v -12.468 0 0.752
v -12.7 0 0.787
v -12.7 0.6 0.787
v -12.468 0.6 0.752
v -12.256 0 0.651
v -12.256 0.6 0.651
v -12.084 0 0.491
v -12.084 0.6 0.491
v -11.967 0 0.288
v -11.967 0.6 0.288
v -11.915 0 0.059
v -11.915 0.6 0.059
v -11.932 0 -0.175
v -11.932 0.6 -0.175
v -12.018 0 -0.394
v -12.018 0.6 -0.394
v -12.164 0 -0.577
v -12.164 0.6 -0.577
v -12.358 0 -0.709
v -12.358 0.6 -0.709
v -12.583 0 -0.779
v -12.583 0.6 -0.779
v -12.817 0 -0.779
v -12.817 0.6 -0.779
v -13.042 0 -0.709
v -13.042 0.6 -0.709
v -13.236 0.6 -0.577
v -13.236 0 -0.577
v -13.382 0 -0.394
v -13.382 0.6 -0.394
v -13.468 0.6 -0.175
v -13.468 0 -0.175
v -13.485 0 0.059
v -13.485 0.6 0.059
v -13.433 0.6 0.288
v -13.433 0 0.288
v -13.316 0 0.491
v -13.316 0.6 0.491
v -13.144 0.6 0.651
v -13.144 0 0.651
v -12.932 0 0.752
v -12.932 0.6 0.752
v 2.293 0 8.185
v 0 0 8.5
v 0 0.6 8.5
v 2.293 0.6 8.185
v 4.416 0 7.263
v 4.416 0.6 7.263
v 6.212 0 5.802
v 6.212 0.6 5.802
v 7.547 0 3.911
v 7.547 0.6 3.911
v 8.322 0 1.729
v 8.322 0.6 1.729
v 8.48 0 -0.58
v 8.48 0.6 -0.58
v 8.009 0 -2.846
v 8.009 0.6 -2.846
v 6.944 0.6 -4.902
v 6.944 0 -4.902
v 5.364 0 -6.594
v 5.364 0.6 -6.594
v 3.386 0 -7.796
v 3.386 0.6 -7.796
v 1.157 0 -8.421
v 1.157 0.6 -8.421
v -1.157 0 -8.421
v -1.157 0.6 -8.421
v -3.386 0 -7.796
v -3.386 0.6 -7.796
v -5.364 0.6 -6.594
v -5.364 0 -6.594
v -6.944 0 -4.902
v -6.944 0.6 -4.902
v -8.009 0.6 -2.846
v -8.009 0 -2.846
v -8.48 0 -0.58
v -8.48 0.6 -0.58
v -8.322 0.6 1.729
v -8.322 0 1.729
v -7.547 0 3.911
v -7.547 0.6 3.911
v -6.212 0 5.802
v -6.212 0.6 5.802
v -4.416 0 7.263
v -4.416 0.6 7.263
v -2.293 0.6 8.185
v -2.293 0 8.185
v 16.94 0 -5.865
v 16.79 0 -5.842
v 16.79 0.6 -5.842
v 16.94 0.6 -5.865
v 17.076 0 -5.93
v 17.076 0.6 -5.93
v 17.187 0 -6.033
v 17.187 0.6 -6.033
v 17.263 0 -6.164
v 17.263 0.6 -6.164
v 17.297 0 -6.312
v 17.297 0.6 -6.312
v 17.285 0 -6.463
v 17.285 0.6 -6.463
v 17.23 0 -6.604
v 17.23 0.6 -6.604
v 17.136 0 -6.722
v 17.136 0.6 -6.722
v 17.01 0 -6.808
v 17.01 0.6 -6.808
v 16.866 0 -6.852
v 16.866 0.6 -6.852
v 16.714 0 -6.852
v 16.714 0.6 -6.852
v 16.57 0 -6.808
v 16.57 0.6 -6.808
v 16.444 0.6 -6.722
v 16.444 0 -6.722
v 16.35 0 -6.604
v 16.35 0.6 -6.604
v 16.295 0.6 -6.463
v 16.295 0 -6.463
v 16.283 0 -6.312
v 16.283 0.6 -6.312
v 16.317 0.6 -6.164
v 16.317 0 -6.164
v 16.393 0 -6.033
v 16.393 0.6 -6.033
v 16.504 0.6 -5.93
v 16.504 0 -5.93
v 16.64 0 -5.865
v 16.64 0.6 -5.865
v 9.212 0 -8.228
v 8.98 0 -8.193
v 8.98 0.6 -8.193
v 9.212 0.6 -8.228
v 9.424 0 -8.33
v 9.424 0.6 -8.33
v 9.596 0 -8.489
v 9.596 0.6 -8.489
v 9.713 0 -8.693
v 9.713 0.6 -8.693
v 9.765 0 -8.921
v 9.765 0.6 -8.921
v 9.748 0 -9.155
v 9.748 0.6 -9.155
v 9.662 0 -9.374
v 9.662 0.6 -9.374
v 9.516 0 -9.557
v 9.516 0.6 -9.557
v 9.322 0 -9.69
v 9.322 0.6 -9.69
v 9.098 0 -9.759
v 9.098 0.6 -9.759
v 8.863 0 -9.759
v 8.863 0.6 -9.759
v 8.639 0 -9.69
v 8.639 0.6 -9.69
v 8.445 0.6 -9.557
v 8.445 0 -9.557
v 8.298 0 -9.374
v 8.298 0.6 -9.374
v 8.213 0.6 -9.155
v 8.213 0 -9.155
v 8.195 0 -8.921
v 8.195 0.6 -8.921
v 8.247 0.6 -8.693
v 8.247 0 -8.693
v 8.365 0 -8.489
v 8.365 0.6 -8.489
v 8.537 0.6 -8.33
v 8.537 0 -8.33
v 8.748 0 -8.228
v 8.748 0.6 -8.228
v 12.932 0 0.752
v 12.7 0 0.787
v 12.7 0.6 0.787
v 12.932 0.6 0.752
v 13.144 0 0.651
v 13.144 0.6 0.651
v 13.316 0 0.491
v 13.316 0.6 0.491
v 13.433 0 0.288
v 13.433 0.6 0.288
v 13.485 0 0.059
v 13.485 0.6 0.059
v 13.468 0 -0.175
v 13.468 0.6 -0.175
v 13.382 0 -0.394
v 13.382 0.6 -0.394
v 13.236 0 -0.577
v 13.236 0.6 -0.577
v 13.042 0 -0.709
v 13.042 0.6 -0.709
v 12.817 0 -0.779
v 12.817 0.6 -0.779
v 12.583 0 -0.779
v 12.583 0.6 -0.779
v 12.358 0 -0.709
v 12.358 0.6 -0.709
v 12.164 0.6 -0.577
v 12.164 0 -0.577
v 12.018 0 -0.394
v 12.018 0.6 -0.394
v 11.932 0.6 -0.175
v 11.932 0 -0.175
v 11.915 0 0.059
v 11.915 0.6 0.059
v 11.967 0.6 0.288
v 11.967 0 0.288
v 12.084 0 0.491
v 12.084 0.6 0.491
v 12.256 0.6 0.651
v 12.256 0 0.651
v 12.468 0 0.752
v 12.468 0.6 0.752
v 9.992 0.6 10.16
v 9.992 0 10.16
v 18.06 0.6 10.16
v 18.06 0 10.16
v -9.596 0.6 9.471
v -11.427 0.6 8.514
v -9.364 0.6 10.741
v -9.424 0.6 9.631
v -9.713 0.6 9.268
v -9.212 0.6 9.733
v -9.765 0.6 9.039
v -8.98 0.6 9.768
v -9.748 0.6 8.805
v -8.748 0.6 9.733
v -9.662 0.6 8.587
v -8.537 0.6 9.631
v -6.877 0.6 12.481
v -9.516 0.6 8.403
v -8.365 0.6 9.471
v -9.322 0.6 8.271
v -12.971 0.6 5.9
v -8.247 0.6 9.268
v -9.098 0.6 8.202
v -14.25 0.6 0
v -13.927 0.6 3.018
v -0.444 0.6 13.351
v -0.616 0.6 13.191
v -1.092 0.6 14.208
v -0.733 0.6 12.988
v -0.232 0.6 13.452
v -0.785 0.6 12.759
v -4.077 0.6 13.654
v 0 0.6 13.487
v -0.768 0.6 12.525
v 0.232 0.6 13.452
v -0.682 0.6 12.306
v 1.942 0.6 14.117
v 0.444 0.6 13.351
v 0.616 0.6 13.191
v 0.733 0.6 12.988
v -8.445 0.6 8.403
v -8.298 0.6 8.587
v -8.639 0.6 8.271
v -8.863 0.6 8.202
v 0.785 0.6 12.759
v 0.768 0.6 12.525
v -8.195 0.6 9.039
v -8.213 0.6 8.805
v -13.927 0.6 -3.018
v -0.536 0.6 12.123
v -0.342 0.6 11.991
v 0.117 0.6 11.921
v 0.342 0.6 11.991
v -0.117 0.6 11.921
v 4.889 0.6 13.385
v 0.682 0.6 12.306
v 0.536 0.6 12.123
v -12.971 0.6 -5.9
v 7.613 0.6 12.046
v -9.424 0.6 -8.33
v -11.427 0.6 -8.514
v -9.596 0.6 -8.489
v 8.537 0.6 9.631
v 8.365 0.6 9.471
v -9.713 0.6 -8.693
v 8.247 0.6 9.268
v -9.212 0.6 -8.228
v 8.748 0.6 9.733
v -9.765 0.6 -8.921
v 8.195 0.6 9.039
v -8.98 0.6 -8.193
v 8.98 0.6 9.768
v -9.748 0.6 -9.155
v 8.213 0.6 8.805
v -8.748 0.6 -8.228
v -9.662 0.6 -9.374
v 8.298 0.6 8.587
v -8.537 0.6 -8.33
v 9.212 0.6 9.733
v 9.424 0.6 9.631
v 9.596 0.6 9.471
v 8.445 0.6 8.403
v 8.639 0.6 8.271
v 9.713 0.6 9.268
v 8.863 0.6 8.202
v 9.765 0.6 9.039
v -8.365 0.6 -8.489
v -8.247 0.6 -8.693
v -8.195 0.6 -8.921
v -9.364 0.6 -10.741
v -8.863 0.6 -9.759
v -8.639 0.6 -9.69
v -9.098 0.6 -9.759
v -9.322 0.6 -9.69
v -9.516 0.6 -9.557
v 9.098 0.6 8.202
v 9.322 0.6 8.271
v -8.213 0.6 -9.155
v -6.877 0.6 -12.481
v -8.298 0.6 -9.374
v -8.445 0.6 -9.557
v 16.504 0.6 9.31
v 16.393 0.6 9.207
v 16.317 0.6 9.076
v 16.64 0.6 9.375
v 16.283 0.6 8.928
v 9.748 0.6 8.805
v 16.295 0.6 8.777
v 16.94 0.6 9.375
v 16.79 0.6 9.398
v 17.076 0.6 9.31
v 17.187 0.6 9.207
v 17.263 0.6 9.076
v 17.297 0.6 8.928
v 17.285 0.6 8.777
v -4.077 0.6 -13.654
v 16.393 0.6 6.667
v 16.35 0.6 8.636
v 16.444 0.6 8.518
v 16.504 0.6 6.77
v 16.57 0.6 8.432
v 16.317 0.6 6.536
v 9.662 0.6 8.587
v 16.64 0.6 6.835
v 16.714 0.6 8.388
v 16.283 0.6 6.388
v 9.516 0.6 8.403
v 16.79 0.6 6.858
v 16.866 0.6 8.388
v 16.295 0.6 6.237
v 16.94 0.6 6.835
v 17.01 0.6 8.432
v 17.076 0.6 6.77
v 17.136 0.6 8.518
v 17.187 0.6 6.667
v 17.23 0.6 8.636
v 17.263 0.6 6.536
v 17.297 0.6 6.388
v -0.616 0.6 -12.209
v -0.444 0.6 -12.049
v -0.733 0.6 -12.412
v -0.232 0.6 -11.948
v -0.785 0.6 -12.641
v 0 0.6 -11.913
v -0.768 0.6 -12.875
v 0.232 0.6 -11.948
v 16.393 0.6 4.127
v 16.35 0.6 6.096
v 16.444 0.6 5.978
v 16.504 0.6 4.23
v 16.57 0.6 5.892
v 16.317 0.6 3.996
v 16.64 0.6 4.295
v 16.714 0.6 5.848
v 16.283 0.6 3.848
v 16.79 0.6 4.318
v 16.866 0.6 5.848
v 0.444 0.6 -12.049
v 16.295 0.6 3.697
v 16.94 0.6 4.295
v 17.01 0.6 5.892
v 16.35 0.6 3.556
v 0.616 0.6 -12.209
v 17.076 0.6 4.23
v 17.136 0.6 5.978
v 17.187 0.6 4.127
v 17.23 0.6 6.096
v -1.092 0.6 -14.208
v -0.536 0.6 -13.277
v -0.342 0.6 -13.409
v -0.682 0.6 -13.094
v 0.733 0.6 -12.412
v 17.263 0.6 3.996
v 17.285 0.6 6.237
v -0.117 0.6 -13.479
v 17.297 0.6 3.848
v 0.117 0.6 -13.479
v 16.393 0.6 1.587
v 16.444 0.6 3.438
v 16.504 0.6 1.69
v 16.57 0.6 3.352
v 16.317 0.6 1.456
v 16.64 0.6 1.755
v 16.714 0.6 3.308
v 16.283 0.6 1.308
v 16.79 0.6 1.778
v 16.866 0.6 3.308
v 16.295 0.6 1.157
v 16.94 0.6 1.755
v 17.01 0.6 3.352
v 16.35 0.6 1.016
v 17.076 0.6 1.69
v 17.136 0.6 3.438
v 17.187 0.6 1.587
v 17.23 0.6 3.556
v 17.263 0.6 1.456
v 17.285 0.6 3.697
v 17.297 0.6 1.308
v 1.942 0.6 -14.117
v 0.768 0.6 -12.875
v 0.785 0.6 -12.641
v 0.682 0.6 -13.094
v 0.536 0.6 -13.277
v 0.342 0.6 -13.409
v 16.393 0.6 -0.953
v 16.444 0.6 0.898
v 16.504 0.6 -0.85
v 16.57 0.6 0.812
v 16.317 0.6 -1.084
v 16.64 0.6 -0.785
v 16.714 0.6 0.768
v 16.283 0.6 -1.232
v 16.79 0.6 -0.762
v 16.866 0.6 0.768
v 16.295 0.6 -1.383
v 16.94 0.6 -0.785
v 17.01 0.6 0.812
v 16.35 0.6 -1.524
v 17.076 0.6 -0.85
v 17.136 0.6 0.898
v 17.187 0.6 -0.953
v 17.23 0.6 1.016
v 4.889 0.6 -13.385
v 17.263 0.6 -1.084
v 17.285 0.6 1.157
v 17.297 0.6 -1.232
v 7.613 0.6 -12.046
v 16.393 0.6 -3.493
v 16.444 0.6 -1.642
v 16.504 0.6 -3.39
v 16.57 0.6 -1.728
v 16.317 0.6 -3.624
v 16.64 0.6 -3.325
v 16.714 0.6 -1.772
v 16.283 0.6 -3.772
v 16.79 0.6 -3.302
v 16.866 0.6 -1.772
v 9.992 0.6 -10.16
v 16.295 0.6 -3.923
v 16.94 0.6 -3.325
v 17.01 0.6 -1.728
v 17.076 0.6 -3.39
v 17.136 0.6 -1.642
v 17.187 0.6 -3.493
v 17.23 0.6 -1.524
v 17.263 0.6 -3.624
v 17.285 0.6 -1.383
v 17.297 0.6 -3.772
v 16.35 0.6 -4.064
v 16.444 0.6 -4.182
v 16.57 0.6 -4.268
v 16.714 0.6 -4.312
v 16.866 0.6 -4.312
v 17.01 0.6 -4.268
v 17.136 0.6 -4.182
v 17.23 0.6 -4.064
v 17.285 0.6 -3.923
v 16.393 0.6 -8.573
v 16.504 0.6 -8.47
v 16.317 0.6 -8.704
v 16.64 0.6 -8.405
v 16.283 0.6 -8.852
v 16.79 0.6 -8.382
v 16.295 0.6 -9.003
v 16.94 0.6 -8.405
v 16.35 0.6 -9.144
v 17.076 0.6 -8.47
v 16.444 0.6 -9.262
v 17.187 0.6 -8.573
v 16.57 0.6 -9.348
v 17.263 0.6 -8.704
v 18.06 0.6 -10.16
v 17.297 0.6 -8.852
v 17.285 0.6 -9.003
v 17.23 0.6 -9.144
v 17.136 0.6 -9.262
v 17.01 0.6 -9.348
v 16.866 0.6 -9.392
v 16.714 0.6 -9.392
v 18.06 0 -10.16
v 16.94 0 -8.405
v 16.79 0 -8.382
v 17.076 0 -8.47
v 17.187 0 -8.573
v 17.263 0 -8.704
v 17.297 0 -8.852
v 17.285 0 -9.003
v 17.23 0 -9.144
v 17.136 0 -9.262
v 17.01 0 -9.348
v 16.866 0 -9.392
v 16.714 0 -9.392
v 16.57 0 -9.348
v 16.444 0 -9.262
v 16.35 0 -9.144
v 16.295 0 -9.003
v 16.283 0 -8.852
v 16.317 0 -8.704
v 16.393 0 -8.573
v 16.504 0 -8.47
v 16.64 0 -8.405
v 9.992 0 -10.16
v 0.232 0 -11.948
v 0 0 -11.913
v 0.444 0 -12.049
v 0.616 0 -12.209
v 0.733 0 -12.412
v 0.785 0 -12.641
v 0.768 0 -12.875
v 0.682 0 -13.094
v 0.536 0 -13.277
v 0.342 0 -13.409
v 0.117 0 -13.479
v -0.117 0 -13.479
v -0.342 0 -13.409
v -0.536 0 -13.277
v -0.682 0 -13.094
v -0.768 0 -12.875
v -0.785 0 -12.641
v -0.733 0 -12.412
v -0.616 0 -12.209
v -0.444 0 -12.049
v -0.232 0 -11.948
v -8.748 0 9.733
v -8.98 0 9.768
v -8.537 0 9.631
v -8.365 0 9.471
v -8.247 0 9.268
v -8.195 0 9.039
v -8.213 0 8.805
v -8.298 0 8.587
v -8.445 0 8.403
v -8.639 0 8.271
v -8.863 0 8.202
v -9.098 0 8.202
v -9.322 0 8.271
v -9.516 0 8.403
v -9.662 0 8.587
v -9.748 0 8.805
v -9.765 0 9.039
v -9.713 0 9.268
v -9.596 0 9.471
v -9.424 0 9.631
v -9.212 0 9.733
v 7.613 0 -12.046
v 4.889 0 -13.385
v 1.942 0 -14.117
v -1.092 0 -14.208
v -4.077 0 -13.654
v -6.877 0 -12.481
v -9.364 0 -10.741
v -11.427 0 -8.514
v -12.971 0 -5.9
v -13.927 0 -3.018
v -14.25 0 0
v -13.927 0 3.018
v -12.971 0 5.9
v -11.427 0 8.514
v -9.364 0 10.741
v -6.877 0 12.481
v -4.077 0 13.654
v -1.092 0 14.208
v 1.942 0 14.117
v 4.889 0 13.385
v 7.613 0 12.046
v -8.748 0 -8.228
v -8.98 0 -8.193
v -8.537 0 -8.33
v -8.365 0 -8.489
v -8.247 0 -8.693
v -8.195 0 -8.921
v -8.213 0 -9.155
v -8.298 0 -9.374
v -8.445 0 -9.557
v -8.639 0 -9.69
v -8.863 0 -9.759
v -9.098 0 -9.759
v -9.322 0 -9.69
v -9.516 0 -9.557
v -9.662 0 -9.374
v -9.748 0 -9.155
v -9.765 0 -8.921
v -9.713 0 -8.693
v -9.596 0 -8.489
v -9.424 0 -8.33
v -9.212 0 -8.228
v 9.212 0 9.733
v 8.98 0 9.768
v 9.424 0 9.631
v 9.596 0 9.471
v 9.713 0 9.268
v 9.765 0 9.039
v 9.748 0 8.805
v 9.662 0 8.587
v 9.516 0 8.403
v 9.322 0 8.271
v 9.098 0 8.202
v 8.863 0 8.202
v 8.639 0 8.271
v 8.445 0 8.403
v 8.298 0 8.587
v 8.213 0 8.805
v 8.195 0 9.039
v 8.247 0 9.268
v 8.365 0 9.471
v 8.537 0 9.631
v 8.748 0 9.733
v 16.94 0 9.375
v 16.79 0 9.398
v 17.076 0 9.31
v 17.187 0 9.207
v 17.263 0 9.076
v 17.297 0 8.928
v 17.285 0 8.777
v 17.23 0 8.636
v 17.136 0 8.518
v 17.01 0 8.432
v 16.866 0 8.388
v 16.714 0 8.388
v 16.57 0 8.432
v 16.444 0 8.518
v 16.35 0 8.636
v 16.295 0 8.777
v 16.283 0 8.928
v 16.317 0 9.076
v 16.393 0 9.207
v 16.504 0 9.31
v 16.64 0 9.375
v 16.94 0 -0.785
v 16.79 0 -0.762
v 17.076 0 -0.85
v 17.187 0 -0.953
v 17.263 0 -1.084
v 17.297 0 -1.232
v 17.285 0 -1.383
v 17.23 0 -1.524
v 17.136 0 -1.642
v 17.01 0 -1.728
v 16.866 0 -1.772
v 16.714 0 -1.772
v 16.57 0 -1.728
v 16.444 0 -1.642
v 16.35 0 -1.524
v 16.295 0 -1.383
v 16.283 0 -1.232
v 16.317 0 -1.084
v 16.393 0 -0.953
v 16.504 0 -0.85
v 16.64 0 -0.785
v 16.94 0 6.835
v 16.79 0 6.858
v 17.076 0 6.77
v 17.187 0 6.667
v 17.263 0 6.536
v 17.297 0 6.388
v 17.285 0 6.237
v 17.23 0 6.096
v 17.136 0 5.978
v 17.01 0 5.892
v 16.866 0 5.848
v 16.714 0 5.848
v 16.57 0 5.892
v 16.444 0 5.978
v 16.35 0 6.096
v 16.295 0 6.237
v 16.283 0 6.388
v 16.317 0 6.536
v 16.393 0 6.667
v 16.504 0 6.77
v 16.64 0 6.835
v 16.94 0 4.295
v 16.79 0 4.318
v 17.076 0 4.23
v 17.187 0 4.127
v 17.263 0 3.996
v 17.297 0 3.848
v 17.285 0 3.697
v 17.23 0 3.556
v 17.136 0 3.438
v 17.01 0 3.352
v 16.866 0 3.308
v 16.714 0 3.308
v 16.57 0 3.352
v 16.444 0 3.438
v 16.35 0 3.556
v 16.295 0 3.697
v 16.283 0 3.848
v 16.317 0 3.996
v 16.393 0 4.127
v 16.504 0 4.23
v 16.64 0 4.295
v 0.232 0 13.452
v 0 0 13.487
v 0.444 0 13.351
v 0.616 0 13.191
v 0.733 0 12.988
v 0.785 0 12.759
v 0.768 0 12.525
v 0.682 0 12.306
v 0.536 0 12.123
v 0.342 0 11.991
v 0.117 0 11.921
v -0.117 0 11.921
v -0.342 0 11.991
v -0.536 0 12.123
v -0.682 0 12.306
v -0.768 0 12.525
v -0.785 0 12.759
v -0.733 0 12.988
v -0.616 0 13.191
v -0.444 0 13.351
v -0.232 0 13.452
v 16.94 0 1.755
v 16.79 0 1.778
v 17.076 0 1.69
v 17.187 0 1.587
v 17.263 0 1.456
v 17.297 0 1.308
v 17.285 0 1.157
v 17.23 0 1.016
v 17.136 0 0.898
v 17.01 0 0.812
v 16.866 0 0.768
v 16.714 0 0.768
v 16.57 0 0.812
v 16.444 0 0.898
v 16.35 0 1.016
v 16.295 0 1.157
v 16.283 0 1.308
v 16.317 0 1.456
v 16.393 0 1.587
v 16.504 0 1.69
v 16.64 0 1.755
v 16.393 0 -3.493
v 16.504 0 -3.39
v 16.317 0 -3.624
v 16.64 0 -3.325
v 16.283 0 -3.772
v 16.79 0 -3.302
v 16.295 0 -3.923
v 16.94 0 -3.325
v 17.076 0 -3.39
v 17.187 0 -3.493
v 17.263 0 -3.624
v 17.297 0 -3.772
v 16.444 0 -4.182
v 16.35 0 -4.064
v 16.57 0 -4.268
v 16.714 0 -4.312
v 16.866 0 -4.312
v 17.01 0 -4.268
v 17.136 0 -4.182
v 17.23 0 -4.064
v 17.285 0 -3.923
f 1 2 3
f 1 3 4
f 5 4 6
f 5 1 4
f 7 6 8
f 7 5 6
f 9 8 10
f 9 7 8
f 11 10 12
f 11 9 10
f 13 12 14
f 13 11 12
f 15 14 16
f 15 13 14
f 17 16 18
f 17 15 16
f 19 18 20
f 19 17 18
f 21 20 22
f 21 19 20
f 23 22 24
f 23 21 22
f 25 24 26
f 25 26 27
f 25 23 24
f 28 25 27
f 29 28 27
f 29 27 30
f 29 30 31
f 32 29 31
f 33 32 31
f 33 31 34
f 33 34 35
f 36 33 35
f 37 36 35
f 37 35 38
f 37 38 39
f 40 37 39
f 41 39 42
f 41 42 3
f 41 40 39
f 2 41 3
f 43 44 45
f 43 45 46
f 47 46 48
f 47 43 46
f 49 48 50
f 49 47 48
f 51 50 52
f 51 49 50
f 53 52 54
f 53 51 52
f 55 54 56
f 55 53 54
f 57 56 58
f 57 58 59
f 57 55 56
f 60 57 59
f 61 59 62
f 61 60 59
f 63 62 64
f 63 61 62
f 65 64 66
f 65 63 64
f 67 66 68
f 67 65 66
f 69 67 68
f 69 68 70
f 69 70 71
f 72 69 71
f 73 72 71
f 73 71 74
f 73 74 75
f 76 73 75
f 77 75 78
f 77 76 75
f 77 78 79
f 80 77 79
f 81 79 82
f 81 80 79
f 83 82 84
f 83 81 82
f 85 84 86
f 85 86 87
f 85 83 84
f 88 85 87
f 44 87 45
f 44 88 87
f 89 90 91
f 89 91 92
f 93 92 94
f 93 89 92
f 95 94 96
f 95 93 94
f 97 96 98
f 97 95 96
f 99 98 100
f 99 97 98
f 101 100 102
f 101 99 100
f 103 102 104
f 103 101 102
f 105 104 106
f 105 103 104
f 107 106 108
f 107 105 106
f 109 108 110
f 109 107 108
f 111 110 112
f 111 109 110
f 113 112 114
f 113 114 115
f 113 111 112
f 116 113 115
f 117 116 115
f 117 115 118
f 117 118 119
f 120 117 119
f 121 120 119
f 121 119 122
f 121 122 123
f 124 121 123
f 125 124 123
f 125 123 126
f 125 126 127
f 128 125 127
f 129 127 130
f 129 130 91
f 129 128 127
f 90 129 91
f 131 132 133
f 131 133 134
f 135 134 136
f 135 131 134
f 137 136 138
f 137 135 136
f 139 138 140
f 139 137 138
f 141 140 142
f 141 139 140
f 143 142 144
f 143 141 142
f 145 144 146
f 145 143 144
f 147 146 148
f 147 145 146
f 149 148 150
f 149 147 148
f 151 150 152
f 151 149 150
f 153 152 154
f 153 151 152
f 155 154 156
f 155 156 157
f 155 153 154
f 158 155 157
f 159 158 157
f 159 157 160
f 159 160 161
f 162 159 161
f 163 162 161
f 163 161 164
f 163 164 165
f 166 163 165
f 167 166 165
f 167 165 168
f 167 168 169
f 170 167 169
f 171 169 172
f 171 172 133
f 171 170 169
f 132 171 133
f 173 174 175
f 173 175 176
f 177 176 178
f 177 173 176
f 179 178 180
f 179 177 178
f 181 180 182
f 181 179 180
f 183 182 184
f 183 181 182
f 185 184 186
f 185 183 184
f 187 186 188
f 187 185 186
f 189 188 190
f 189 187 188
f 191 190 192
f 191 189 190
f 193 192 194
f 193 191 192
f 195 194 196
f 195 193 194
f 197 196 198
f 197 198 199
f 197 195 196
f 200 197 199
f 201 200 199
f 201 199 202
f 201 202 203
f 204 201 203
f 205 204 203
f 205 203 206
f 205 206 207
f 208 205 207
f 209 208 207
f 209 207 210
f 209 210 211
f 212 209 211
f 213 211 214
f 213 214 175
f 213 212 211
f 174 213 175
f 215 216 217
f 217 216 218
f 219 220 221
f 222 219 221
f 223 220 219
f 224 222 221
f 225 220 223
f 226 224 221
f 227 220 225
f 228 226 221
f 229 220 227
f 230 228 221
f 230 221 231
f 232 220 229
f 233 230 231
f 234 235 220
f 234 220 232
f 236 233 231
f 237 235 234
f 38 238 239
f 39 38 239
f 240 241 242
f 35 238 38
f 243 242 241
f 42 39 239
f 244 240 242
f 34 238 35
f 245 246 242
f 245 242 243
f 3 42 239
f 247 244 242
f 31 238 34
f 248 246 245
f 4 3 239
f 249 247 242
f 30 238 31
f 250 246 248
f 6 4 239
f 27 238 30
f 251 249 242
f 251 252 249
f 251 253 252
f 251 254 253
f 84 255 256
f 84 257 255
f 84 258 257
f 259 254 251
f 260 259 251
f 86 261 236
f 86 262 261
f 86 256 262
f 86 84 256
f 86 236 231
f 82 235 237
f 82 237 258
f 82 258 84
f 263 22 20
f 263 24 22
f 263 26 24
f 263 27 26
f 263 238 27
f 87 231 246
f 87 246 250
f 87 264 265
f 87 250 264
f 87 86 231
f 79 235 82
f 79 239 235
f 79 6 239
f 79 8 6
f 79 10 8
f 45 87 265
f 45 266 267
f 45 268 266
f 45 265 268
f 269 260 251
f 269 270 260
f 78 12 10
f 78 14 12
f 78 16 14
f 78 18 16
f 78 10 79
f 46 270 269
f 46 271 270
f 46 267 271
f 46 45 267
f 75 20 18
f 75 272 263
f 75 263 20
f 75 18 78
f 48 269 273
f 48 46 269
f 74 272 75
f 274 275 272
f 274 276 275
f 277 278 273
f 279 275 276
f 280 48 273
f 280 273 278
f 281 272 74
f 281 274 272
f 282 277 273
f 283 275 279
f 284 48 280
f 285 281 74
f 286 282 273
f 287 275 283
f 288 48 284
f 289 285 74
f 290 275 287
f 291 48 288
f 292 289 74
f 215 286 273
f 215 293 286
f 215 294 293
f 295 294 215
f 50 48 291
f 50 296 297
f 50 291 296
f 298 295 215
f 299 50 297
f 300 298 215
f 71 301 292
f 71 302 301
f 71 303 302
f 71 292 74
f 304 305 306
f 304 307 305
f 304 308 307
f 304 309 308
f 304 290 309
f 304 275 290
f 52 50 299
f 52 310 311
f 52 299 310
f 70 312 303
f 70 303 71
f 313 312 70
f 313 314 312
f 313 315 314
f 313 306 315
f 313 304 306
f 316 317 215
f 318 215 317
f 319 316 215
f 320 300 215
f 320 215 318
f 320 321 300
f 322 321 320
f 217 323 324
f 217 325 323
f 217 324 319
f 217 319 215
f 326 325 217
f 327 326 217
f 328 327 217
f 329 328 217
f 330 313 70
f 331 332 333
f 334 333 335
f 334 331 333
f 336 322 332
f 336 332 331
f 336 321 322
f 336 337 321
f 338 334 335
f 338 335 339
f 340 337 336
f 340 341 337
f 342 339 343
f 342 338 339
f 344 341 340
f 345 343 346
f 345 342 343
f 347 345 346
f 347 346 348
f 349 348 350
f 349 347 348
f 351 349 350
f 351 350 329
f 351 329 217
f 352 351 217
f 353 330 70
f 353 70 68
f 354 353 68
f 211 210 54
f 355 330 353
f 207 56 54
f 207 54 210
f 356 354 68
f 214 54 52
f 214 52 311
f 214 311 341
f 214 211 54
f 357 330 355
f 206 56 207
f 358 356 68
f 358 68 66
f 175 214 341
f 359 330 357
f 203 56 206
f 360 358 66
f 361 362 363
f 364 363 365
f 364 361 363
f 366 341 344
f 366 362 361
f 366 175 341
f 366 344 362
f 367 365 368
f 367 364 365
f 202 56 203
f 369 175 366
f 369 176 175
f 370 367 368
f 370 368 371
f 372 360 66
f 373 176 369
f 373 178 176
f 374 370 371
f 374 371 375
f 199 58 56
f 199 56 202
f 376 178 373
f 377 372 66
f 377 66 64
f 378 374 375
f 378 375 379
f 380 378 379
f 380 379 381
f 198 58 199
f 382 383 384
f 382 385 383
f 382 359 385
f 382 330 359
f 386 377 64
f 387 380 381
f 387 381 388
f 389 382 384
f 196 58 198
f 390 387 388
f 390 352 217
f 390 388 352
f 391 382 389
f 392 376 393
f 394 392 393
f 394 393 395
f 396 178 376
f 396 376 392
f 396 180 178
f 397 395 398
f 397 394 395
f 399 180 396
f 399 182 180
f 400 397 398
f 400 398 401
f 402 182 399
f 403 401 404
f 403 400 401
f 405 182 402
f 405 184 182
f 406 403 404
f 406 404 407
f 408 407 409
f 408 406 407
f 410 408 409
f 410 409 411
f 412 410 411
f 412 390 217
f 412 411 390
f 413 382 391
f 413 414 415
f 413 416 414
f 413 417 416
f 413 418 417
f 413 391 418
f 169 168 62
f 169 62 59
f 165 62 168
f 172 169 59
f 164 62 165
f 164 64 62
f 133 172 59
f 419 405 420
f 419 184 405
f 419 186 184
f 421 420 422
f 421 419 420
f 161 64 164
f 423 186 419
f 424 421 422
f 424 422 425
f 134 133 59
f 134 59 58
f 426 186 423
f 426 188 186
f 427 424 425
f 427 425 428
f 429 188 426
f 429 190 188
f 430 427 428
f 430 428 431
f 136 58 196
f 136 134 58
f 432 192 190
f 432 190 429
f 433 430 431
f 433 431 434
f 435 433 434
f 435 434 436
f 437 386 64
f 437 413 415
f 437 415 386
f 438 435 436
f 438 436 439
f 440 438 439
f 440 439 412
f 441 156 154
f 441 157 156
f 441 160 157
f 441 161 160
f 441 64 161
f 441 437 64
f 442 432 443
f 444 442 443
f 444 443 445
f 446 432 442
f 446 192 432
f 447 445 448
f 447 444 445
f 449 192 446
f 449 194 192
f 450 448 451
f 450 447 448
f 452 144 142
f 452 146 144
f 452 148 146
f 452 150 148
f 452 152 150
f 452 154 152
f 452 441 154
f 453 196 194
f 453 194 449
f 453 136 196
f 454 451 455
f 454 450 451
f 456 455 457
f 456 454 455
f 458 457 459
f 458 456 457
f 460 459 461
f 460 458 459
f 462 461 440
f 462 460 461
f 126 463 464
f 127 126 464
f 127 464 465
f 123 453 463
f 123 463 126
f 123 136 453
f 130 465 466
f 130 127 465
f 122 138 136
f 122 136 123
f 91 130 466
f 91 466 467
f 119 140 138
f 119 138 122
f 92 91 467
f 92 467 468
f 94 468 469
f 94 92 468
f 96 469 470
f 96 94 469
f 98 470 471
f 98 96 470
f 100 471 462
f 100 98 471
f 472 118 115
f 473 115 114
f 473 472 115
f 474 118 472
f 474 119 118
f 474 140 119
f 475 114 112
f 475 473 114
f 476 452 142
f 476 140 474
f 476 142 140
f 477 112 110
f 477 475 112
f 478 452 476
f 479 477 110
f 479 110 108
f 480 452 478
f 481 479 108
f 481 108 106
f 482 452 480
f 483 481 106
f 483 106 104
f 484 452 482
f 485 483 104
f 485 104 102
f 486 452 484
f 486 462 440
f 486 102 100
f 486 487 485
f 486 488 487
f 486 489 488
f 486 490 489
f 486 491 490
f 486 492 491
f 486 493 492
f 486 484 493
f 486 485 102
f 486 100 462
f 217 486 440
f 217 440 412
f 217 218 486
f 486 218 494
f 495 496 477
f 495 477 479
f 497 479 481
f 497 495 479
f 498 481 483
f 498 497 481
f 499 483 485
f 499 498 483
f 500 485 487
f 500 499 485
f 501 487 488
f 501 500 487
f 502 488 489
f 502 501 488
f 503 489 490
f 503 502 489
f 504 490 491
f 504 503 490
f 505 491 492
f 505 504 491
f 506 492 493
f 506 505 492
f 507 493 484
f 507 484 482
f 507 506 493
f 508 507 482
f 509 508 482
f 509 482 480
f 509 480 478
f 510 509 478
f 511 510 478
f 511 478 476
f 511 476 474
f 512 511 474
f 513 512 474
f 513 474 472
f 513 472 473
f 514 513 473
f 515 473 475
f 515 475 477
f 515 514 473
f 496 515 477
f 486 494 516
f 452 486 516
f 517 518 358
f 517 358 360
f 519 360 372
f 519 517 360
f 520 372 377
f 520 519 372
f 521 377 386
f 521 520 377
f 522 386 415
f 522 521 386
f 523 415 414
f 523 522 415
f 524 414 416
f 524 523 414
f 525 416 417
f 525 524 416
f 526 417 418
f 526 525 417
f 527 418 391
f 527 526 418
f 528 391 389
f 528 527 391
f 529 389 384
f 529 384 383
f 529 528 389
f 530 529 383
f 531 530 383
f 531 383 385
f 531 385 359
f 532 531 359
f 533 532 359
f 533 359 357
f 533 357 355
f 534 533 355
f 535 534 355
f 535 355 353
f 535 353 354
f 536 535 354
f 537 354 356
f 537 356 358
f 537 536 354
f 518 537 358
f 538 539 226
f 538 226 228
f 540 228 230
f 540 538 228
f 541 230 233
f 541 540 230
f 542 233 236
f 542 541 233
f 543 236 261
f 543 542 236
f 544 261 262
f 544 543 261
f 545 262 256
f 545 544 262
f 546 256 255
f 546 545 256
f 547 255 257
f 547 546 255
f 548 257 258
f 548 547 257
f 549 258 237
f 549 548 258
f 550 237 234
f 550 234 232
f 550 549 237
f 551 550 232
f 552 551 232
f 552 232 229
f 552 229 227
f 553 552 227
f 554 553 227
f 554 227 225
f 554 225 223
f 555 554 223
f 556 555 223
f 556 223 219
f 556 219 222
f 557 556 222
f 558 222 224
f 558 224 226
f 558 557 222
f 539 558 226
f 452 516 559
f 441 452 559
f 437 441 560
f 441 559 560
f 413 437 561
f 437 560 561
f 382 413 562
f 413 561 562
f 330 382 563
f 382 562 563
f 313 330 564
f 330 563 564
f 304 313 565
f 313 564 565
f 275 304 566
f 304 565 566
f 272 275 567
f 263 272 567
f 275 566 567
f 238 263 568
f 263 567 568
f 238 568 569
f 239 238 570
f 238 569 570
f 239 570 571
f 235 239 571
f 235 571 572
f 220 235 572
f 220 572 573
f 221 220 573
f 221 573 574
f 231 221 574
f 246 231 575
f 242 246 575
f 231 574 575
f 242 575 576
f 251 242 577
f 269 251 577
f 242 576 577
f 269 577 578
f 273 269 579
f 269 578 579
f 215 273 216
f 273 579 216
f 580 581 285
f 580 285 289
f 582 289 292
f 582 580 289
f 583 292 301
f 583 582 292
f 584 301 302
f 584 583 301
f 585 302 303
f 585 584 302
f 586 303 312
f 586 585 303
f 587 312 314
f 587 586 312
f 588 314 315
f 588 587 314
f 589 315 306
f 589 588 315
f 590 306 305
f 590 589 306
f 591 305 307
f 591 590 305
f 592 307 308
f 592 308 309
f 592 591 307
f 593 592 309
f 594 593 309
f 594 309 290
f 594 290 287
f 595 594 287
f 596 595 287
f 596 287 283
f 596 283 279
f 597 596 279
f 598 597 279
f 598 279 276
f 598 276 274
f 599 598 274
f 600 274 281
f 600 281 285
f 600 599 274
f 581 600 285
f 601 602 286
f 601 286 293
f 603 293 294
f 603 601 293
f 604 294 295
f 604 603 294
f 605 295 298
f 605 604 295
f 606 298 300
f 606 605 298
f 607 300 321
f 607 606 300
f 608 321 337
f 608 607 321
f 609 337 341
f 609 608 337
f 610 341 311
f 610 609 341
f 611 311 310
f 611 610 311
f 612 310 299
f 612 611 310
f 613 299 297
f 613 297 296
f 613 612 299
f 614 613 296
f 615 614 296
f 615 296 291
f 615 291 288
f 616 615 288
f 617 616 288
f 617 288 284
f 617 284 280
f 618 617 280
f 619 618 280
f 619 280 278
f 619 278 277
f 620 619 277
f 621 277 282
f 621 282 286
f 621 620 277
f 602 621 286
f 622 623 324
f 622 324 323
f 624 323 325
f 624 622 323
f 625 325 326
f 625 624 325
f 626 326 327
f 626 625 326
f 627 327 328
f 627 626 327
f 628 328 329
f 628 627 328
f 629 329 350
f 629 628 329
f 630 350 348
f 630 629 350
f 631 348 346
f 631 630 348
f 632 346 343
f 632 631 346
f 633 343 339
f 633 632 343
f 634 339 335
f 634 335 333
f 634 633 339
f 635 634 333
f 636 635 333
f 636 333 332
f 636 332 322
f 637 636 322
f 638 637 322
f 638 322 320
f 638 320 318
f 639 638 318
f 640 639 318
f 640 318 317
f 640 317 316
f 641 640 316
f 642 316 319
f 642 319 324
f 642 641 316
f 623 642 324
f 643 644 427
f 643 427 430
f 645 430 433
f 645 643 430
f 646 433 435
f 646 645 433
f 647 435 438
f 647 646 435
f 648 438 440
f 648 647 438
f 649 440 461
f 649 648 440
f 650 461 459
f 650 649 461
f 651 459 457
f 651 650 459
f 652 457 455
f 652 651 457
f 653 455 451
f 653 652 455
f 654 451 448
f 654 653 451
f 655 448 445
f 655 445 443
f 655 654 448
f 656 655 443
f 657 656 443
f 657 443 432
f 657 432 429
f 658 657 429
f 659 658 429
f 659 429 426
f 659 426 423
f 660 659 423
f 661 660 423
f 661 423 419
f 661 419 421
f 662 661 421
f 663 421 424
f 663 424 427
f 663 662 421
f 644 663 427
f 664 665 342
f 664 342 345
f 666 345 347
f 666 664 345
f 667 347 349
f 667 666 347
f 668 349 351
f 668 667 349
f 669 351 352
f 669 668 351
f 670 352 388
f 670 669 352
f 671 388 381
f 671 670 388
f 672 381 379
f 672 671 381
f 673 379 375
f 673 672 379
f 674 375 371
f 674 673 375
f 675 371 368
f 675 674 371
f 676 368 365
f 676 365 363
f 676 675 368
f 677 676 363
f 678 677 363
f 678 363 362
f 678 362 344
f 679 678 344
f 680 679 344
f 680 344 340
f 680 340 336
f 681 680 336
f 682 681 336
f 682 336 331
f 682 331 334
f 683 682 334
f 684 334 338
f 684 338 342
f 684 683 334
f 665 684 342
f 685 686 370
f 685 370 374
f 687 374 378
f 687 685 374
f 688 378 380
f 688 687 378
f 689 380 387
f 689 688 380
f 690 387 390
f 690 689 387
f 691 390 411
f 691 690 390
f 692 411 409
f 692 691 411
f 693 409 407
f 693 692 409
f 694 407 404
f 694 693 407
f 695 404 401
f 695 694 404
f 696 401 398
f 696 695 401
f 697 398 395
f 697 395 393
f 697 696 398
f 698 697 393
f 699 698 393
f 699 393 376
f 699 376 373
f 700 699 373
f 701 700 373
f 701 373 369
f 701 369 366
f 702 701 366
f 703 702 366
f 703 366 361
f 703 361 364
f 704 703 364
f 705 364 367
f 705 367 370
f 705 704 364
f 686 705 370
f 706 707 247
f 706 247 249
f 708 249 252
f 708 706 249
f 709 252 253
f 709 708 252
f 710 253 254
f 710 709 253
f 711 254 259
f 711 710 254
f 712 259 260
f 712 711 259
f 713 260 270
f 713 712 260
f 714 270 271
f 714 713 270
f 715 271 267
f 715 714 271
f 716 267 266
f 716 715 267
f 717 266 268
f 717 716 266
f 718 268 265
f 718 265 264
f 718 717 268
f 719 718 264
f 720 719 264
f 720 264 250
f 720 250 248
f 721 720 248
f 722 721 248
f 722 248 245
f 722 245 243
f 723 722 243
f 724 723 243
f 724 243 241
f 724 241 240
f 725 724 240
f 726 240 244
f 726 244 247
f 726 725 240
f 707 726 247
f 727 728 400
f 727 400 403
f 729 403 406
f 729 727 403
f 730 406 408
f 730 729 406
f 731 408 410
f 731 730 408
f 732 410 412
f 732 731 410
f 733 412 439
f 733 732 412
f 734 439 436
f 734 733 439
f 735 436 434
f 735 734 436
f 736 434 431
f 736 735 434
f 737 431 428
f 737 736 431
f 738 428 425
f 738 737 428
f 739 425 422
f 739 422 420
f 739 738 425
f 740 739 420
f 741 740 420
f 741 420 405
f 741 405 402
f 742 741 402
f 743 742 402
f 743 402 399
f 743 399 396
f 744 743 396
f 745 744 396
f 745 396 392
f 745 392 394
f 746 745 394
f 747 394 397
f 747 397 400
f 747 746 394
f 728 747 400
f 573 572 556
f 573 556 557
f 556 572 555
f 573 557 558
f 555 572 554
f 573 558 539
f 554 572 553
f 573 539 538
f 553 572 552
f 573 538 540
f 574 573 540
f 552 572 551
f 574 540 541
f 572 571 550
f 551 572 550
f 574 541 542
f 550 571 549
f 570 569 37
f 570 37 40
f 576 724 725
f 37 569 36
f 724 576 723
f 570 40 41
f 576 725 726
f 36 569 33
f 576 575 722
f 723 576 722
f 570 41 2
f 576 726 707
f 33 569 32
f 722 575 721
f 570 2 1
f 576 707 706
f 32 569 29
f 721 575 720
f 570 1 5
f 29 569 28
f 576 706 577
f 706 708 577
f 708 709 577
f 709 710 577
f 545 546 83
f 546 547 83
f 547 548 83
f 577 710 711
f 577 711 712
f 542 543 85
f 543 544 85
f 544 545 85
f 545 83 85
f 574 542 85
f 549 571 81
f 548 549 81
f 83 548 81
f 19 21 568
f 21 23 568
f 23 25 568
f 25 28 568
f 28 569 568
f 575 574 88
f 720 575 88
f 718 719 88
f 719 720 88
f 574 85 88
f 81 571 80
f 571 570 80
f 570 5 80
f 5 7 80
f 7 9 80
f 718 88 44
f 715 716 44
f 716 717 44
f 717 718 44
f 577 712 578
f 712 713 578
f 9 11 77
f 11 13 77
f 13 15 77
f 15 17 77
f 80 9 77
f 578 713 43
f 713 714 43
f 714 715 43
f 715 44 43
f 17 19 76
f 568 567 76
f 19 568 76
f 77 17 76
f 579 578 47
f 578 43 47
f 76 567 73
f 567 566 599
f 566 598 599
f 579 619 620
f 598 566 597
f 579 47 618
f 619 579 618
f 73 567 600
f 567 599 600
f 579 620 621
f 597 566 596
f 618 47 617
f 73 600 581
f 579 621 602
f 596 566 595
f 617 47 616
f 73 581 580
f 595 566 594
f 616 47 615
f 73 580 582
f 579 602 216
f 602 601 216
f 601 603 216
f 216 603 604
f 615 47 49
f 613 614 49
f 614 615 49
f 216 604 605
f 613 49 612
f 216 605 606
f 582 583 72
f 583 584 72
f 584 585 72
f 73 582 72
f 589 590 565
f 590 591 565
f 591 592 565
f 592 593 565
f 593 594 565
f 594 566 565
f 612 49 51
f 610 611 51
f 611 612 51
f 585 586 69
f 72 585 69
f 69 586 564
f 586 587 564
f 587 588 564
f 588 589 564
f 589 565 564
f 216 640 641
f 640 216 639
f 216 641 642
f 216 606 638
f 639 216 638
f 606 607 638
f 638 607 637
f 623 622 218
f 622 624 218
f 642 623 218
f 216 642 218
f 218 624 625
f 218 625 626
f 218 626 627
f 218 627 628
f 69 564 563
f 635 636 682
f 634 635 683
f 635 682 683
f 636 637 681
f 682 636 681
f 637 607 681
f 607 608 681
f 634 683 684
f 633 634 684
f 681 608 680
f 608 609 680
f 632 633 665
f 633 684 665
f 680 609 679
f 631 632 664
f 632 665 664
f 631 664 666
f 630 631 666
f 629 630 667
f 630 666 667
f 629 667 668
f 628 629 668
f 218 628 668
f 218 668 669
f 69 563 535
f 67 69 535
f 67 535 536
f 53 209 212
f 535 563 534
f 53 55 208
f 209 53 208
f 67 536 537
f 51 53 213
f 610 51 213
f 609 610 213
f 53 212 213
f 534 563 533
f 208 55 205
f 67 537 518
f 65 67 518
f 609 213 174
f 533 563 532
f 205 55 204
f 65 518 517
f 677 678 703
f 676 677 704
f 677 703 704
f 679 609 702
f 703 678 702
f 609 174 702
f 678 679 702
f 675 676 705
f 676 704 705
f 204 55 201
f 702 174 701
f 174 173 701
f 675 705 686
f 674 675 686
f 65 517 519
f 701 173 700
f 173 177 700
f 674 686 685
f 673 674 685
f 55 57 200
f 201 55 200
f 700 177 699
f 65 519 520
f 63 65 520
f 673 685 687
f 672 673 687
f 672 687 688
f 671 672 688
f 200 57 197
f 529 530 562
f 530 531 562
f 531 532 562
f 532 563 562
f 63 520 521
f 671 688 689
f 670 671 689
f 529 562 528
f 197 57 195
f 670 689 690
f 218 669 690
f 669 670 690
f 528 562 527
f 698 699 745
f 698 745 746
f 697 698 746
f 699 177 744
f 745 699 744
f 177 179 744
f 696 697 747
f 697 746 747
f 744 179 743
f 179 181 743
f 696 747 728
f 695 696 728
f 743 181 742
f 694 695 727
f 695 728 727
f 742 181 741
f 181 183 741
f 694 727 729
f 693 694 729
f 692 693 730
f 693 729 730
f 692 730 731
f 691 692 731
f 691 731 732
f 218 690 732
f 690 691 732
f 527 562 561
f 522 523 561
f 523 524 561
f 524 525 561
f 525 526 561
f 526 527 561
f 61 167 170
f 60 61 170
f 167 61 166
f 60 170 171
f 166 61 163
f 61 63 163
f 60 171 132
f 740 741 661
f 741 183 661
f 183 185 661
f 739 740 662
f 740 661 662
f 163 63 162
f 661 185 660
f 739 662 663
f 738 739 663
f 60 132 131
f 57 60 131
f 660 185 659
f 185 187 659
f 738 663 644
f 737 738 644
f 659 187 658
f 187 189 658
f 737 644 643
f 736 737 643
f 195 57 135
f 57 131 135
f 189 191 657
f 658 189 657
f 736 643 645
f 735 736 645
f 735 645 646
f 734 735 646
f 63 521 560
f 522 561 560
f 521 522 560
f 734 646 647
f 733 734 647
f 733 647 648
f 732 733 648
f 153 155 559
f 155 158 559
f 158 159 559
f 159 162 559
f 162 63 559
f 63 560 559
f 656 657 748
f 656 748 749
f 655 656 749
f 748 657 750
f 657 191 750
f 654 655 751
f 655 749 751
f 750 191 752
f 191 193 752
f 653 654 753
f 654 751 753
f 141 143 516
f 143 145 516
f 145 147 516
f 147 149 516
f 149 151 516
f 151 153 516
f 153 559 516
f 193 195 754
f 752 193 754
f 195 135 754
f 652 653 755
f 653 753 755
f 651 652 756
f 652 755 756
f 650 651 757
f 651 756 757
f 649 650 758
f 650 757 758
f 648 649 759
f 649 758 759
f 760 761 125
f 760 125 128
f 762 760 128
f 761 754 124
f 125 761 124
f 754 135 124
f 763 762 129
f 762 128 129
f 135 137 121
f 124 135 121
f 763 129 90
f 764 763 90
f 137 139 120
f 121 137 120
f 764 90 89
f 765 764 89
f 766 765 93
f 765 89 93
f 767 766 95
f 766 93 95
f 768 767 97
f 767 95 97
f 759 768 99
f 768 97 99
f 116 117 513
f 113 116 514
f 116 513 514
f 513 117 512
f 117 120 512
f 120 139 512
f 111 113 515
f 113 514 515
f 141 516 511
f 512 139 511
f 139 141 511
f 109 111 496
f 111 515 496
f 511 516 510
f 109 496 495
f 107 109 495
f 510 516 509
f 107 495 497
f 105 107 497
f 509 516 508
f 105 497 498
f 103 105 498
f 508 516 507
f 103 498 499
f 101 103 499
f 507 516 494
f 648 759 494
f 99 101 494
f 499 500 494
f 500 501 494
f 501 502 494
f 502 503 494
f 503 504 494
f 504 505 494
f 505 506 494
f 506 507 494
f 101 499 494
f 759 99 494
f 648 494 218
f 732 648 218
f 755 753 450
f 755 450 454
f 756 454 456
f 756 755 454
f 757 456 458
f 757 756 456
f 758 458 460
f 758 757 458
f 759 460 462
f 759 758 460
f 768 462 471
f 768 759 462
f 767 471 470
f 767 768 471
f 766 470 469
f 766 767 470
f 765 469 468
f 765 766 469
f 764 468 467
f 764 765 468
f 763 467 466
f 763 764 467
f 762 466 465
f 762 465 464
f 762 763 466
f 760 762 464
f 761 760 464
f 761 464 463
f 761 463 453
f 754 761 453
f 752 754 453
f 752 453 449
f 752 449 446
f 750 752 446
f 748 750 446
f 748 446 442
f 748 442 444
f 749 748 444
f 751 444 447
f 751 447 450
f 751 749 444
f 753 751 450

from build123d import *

# Parameters (mm, degrees)
SKETCH1_R           = 0.7874
SKETCH1_R_2         = 8.5
SKETCH1_R_3         = 0.508
BOSS_EXTRUDE1_DEPTH = 0.6


with BuildPart() as part:
    # Sketch1 → Boss-Extrude1 (new body)
    # profile 1 of 3: a face of its own
    with BuildSketch(Plane(origin=(0, 0, 0), x_dir=(1, 0, 0), z_dir=(0, 1, 0))):
        with BuildLine():
            Line((9.991841672, -10.16), (9.991841672, 10.16))
            ThreePointArc((9.991841672, 10.16), (-14.25, 0), (9.991841672, -10.16))
        make_face()
        with Locations(Location((-8.980256121, -8.980256121, 0), (0, 0, 270))):
            Circle(SKETCH1_R, mode=Mode.SUBTRACT)
        with Locations(Location((0, -12.7, 0), (0, 0, 270))):
            Circle(SKETCH1_R, mode=Mode.SUBTRACT)
        with Locations(Location((8.980256121, -8.980256121, 0), (0, 0, 270))):
            Circle(SKETCH1_R, mode=Mode.SUBTRACT)
        with Locations(Location((-12.7, 0, 0), (0, 0, 270))):
            Circle(SKETCH1_R, mode=Mode.SUBTRACT)
        with Locations(Location((0, 0, 0), (0, 0, 270))):
            Circle(SKETCH1_R_2, mode=Mode.SUBTRACT)
        with Locations(Location((-8.980256121, 8.980256121, 0), (0, 0, 270))):
            Circle(SKETCH1_R, mode=Mode.SUBTRACT)
        with Locations(Location((0, 12.7, 0), (0, 0, 270))):
            Circle(SKETCH1_R, mode=Mode.SUBTRACT)
        with Locations(Location((8.980256121, 8.980256121, 0), (0, 0, 270))):
            Circle(SKETCH1_R, mode=Mode.SUBTRACT)
    # profile 2 of 3: a face of its own
    with BuildSketch(Plane(origin=(0, 0, 0), x_dir=(1, 0, 0), z_dir=(0, 1, 0))):
        with BuildLine():
            ThreePointArc((14.25, 0), (13.142416898, 5.508119288), (9.991841672, 10.16))
            Line((9.991841672, 10.16), (9.991841672, -10.16))
            ThreePointArc((9.991841672, -10.16), (13.142416898, -5.508119288), (14.25, 0))
        make_face()
        with Locations(Location((12.7, 0, 0), (0, 0, 270))):
            Circle(SKETCH1_R, mode=Mode.SUBTRACT)
    # profile 3 of 3: a face of its own
    with BuildSketch(Plane(origin=(0, 0, 0), x_dir=(1, 0, 0), z_dir=(0, 1, 0))):
        with BuildLine():
            Line((18.06, 10.16), (9.991841672, 10.16))
            ThreePointArc((9.991841672, 10.16), (13.142416898, 5.508119288), (14.25, 0))
            ThreePointArc((14.25, 0), (13.142416898, -5.508119288), (9.991841672, -10.16))
            Line((9.991841672, -10.16), (18.06, -10.16))
            Line((18.06, -10.16), (18.06, 10.16))
        make_face()
        with Locations(Location((16.79, -8.89, 0), (0, 0, 270))):
            Circle(SKETCH1_R_3, mode=Mode.SUBTRACT)
        with Locations(Location((16.79, -6.35, 0), (0, 0, 270))):
            Circle(SKETCH1_R_3, mode=Mode.SUBTRACT)
        with Locations(Location((16.79, -3.81, 0), (0, 0, 270))):
            Circle(SKETCH1_R_3, mode=Mode.SUBTRACT)
        with Locations(Location((16.79, -1.27, 0), (0, 0, 270))):
            Circle(SKETCH1_R_3, mode=Mode.SUBTRACT)
        with Locations(Location((16.79, 1.27, 0), (0, 0, 270))):
            Circle(SKETCH1_R_3, mode=Mode.SUBTRACT)
        with Locations(Location((16.79, 3.81, 0), (0, 0, 270))):
            Circle(SKETCH1_R_3, mode=Mode.SUBTRACT)
        with Locations(Location((16.79, 6.35, 0), (0, 0, 270))):
            Circle(SKETCH1_R_3, mode=Mode.SUBTRACT)
        with Locations(Location((16.79, 8.89, 0), (0, 0, 270))):
            Circle(SKETCH1_R_3, mode=Mode.SUBTRACT)
    extrude(amount=BOSS_EXTRUDE1_DEPTH)


solid = part.part
